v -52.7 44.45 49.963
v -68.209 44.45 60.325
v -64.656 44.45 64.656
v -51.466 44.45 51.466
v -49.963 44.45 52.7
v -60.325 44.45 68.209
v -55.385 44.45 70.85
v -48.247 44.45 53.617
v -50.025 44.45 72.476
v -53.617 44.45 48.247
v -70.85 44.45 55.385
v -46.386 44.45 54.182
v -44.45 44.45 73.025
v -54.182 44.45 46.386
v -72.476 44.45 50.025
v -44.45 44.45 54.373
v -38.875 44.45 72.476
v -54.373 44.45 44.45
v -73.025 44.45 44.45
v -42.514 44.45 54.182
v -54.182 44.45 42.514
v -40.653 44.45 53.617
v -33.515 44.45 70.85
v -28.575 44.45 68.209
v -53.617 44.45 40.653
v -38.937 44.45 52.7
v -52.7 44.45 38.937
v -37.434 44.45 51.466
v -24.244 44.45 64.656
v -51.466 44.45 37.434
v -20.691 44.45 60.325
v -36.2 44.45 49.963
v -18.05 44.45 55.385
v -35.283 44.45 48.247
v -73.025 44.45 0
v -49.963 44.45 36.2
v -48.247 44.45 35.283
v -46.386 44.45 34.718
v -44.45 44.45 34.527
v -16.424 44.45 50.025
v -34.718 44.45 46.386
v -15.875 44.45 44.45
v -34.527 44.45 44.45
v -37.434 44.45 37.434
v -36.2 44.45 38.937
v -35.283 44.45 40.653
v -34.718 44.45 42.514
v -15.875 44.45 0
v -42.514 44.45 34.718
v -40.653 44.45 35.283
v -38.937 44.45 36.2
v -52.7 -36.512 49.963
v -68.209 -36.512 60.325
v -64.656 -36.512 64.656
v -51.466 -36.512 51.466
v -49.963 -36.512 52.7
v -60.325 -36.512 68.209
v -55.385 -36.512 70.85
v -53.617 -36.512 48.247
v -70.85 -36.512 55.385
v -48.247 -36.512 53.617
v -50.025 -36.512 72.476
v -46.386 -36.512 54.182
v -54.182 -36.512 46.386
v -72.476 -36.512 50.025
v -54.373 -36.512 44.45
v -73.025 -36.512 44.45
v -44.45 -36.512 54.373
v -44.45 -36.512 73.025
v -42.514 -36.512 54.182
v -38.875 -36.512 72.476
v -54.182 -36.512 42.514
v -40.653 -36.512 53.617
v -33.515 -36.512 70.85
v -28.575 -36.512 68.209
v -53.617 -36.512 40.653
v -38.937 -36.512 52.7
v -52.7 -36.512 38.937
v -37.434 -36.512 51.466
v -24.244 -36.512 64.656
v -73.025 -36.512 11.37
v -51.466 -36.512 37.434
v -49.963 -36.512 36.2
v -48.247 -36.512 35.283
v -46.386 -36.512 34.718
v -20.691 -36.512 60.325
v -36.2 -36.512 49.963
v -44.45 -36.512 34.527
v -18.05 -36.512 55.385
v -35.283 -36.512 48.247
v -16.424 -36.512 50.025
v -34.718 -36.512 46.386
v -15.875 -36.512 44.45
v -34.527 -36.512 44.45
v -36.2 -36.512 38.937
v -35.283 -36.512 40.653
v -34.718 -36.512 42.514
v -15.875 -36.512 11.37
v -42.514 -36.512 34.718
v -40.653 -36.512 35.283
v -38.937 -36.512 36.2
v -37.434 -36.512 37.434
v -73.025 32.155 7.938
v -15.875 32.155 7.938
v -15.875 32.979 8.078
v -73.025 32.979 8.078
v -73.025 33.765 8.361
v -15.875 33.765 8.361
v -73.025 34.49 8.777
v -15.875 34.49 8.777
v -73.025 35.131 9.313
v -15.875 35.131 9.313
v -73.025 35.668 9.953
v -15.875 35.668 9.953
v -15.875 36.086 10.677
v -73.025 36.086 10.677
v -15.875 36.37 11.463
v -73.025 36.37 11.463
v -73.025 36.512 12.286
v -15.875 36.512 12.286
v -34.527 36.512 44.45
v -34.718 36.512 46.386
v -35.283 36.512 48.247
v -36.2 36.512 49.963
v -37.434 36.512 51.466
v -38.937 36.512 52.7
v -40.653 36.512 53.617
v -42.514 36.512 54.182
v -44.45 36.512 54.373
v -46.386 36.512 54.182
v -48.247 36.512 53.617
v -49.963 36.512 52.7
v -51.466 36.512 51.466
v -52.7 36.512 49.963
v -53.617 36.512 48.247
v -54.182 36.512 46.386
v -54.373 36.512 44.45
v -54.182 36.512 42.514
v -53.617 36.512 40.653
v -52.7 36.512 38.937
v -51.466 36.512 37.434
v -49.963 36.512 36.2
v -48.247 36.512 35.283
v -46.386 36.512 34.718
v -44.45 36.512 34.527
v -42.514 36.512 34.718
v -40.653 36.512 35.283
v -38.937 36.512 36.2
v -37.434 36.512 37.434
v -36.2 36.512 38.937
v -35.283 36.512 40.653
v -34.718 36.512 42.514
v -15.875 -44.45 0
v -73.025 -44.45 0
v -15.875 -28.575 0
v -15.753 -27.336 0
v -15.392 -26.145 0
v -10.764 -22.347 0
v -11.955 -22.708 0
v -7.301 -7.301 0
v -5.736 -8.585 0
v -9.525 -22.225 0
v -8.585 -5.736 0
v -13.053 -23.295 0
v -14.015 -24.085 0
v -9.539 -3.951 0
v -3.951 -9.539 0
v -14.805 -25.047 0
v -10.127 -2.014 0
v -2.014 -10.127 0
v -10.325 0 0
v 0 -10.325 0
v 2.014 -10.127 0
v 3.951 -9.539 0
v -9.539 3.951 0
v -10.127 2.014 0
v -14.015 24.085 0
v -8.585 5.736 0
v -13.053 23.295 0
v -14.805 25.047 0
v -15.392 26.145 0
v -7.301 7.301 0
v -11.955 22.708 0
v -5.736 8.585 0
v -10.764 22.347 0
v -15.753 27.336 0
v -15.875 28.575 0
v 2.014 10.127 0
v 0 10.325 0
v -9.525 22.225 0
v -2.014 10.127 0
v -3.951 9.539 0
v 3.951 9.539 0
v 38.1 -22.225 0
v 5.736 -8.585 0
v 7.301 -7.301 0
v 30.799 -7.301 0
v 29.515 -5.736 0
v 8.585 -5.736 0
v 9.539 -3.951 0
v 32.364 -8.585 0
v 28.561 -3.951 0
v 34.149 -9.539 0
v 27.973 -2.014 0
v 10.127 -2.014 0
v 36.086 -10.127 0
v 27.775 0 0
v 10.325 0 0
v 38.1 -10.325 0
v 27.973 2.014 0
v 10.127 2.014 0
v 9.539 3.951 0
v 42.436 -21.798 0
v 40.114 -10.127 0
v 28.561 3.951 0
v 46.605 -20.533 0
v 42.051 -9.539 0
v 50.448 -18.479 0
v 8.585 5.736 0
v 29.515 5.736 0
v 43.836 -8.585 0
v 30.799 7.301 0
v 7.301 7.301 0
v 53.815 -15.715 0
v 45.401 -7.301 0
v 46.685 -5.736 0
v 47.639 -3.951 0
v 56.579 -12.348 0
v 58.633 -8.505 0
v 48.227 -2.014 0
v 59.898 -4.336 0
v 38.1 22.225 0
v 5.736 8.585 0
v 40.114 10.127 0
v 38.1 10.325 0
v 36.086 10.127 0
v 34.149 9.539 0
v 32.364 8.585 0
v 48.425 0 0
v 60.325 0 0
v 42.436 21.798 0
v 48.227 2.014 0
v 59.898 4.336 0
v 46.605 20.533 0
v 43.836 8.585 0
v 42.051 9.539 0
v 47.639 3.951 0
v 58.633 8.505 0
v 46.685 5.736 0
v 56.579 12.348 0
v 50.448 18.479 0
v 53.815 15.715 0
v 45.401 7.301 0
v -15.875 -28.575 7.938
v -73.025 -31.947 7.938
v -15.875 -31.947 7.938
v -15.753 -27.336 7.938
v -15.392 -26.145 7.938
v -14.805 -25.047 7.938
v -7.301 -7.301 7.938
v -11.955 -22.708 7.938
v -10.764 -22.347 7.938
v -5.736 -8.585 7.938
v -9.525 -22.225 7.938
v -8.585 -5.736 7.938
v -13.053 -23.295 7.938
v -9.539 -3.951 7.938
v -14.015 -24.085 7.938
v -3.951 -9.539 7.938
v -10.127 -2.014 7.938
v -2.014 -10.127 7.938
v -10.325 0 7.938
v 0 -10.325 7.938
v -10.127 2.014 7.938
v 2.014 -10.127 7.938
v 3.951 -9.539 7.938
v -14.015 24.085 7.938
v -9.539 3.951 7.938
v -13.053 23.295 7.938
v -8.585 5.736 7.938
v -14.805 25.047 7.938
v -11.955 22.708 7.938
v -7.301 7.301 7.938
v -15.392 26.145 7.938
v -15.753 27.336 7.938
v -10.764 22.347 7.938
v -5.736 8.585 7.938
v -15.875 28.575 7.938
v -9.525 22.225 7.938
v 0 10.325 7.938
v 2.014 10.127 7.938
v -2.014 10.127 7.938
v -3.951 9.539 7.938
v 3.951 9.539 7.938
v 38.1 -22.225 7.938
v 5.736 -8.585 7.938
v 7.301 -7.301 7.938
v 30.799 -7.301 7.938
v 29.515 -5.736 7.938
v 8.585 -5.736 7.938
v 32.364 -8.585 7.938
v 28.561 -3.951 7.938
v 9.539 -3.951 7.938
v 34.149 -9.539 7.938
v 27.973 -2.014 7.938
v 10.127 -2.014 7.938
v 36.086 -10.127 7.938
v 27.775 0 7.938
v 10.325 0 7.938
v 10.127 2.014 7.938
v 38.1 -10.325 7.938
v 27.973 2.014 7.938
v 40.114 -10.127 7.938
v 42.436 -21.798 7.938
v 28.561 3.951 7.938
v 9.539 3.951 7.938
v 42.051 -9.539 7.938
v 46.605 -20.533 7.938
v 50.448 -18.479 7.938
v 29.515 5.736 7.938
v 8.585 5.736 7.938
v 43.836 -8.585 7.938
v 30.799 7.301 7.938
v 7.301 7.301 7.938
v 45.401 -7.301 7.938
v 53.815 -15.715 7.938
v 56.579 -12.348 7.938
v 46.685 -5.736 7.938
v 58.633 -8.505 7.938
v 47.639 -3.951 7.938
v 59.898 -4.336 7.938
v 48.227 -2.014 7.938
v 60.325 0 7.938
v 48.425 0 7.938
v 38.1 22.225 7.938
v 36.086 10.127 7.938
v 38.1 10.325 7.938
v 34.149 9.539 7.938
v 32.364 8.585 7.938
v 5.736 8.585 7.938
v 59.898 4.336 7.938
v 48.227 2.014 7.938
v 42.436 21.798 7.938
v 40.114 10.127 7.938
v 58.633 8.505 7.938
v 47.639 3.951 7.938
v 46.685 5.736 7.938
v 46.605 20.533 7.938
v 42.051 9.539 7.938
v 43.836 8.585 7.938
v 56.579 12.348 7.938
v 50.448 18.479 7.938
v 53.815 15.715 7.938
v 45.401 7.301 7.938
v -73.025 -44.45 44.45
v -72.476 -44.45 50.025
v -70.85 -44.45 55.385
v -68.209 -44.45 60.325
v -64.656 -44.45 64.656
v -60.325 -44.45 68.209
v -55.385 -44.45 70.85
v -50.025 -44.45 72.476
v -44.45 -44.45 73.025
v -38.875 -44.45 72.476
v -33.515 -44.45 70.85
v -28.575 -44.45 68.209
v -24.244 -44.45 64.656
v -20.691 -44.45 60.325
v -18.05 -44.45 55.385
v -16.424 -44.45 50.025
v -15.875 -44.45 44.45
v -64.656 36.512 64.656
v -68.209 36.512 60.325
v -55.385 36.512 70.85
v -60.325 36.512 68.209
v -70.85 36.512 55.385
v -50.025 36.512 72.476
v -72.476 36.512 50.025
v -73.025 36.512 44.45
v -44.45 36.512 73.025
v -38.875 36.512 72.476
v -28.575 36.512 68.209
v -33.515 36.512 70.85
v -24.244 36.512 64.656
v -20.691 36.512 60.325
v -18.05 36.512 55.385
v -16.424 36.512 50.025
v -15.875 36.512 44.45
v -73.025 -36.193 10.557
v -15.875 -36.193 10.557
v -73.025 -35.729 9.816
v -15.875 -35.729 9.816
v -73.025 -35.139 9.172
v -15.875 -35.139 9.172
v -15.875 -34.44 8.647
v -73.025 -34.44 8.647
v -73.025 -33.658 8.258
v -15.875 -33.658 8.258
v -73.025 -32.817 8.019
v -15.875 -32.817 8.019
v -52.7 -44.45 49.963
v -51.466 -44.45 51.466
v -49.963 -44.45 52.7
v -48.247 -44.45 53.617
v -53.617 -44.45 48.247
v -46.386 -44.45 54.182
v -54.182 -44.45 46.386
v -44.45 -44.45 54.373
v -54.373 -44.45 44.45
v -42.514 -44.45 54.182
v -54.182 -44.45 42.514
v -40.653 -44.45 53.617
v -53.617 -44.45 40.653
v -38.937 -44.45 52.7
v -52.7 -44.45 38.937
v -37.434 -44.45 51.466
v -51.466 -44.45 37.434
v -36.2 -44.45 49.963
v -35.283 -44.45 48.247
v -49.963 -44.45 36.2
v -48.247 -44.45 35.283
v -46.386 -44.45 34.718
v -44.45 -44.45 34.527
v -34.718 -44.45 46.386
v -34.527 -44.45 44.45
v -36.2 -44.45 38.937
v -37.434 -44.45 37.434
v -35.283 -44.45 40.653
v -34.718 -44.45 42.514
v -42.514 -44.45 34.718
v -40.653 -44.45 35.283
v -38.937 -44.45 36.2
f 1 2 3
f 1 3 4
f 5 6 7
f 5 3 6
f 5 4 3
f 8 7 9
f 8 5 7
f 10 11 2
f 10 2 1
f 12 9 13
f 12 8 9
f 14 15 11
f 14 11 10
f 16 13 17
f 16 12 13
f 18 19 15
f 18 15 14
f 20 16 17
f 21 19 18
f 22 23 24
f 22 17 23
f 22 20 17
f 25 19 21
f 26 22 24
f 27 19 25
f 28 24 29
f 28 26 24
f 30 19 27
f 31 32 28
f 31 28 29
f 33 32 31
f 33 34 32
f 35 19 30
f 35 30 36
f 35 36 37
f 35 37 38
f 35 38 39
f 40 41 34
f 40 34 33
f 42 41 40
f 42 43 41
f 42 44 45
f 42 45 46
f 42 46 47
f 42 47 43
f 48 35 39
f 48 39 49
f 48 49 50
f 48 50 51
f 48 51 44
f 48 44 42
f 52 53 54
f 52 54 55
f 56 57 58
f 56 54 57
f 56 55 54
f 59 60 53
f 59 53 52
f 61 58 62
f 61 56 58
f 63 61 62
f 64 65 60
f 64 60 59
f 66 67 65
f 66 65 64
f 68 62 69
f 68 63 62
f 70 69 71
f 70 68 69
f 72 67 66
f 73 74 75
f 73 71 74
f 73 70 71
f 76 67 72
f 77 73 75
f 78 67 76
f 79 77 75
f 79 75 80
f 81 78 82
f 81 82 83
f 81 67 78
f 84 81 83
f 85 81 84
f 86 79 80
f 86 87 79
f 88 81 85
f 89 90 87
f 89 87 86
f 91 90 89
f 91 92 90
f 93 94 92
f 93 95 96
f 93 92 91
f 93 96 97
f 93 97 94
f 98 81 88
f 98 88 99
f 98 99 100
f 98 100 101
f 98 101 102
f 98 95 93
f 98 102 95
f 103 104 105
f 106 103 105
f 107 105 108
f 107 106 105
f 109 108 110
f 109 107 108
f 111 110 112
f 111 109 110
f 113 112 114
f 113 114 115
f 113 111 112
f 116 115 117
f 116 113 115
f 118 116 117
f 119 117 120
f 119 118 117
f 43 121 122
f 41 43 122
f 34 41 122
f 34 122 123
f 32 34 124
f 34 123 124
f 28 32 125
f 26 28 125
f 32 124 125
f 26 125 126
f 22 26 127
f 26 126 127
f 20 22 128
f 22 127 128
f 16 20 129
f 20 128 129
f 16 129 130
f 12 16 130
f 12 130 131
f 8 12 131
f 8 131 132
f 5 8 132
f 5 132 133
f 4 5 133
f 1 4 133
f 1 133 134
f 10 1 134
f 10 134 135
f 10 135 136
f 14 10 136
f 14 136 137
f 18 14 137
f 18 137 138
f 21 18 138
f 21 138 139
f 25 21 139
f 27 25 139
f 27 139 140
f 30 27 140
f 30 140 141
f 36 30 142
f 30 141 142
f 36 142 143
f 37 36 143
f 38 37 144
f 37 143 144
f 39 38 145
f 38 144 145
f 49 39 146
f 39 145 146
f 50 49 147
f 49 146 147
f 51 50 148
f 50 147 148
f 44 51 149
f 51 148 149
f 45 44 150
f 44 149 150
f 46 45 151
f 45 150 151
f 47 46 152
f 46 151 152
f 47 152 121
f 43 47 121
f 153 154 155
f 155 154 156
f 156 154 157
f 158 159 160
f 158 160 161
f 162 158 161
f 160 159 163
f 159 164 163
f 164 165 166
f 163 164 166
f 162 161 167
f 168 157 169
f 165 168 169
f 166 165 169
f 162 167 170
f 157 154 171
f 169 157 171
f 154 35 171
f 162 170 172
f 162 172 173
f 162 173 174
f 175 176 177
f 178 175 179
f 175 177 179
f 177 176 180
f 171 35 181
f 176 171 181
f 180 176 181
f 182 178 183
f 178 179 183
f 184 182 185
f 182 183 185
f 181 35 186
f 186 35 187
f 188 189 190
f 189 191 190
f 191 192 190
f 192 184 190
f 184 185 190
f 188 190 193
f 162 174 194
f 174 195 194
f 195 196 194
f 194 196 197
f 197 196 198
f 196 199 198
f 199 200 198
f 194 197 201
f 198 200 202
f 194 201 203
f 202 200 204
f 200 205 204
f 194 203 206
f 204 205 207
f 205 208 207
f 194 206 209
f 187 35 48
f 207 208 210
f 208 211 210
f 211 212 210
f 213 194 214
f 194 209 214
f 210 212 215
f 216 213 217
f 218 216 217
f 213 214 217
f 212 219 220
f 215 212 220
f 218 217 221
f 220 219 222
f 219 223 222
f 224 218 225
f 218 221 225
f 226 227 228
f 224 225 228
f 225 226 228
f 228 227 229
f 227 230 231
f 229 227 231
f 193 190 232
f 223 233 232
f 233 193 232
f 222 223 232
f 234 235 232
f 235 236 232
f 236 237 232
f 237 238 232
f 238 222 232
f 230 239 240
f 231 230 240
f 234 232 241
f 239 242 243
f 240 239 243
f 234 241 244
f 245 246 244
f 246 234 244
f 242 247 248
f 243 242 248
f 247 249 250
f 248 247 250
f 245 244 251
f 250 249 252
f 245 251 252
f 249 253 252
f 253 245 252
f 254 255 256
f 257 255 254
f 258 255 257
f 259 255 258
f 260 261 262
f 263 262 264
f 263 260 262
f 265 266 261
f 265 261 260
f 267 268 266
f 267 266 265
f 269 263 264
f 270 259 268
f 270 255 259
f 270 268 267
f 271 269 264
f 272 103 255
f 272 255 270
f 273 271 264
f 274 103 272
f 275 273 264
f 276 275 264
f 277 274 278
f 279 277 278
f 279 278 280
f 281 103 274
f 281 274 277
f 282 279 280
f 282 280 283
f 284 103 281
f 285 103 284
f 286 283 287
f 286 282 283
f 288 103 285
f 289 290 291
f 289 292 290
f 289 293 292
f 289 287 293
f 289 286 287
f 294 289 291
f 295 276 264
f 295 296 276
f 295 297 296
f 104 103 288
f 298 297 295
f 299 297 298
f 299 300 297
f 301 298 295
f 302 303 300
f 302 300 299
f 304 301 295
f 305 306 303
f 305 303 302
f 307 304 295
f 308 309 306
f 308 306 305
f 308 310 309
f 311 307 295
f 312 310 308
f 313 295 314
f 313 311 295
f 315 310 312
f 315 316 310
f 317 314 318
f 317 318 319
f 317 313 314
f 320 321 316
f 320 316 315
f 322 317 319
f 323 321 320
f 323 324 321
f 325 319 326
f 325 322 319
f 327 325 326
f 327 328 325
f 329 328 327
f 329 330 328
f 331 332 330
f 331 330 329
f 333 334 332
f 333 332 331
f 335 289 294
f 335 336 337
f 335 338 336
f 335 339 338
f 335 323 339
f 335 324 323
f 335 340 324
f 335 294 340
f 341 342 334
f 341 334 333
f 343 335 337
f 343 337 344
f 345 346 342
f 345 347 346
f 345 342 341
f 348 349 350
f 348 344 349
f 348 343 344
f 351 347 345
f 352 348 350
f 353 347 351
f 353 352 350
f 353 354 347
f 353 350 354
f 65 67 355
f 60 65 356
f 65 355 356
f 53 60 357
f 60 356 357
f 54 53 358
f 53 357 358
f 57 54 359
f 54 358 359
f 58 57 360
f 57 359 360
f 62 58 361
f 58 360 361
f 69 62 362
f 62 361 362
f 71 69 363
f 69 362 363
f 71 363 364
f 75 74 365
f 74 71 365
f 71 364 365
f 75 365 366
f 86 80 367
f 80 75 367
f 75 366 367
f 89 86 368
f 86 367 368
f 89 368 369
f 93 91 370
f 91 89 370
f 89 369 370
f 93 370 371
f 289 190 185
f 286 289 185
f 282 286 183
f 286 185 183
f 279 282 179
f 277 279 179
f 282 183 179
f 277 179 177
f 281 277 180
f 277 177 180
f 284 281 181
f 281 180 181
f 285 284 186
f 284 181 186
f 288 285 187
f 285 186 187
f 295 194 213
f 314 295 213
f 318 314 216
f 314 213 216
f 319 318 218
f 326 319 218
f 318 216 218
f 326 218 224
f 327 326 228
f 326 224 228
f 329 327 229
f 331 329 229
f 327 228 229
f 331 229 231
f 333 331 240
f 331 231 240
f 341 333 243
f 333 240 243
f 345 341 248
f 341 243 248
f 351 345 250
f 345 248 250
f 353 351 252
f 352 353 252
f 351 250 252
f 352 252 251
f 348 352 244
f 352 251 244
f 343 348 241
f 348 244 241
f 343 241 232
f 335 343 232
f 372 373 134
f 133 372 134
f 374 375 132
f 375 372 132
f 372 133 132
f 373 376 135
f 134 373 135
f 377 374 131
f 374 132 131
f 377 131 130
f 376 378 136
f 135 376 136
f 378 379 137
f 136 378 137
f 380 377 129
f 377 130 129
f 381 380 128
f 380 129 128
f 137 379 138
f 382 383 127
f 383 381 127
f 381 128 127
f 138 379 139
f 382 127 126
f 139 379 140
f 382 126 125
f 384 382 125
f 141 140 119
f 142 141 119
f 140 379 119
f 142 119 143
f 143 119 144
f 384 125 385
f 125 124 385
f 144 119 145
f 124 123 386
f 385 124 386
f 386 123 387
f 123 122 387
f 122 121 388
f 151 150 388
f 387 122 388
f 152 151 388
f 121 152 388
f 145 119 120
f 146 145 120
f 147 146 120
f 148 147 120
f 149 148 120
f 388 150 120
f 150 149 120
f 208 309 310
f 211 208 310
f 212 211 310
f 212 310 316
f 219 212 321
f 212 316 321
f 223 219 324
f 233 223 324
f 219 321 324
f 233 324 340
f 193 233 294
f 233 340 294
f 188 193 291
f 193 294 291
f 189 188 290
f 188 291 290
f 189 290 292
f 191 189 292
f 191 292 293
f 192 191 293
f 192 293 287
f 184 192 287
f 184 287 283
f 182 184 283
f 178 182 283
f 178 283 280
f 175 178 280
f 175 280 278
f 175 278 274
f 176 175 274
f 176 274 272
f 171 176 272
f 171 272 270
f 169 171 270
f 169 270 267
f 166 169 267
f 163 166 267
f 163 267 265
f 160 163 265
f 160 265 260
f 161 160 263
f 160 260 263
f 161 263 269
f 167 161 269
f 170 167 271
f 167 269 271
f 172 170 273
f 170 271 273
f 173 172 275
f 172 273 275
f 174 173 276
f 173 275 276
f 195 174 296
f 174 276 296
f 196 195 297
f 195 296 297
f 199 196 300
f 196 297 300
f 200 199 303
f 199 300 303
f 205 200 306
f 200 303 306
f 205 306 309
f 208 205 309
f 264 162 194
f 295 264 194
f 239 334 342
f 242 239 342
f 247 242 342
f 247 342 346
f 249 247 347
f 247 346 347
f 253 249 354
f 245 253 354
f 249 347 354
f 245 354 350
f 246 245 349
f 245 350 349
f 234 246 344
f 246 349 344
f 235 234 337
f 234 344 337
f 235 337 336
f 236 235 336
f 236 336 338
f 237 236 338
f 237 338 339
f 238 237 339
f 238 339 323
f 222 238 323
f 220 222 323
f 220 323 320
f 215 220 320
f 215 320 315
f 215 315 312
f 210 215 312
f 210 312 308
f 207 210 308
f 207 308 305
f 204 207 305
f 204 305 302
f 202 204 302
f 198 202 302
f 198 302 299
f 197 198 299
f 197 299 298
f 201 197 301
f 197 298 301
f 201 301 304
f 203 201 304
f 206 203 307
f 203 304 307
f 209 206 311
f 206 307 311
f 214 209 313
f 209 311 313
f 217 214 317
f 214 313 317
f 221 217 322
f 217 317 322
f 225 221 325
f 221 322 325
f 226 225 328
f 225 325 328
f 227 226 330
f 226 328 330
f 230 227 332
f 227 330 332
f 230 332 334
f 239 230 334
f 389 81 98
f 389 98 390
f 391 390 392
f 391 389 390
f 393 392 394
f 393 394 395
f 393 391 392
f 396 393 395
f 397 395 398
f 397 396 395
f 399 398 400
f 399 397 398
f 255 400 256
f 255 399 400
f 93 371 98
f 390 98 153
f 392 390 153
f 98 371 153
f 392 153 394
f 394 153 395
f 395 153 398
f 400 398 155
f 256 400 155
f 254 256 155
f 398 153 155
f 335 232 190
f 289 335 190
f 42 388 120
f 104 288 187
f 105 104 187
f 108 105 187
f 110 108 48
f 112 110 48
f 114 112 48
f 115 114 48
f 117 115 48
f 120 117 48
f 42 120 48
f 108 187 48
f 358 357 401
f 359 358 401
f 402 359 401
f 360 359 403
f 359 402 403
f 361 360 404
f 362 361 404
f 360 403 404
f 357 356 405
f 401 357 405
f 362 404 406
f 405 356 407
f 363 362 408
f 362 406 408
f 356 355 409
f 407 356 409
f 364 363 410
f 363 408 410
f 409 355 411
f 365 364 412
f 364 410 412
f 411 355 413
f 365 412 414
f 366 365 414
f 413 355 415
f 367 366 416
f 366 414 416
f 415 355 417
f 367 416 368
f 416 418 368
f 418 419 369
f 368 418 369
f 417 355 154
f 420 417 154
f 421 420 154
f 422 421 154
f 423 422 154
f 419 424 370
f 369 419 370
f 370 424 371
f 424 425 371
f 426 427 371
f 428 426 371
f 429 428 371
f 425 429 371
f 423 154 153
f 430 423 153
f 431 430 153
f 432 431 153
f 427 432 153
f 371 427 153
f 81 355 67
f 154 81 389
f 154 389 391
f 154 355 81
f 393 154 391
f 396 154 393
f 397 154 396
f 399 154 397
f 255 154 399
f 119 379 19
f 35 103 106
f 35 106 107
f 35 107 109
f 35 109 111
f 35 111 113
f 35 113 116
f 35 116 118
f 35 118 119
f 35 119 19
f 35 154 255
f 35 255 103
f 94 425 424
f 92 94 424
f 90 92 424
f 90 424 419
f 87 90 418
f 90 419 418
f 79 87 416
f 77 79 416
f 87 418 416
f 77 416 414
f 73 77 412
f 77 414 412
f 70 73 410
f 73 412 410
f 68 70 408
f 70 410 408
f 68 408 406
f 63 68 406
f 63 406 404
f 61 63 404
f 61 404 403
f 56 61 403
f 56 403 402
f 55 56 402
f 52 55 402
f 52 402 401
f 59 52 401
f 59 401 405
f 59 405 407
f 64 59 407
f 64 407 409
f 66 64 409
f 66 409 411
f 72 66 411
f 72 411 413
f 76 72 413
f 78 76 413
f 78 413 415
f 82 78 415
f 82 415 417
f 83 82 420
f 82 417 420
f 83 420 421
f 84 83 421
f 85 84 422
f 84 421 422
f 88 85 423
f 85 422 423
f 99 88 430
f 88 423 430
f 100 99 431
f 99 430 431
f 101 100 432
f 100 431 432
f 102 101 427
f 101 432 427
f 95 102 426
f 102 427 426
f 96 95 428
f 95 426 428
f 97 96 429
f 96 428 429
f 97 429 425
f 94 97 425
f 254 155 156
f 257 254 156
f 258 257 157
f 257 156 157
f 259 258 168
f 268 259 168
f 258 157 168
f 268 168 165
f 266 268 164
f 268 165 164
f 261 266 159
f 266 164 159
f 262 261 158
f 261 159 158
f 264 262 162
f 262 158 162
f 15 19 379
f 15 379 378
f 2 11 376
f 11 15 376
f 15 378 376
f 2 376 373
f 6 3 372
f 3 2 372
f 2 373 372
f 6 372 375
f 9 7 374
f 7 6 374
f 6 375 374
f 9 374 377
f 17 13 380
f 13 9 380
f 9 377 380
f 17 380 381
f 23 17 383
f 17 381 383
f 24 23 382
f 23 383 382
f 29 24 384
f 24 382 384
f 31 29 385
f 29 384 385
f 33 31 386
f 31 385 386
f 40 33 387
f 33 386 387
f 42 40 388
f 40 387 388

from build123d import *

# Parameters (mm, degrees)
F1_DEPTH = 7.9375
F2_W     = 57.15
F2_H     = 7.9375
F3_DEPTH = 76.2
F4_R     = 9.92251
F5_DEPTH = 88.901
F6_R     = 10.3251
F7_DEPTH = 25.4
F9_DEPTH = 57.15


with BuildPart() as f1:
    # F0 (on Top) → F1 (new body)
    with BuildSketch(Plane.XY):
        with BuildLine():
            Line((-9.525, -22.225), (38.1, -22.225))
            ThreePointArc((38.1, -22.225), (60.325, 0), (38.1, 22.225))
            Line((38.1, 22.225), (-9.525, 22.225))
            ThreePointArc((-9.525, 22.225), (-14.015128, 24.084872), (-15.875, 28.575))
            Line((-15.875, 28.575), (-15.875, 44.45))
            Line((-15.875, 44.45), (-73.025, 44.45))
            Line((-73.025, 44.45), (-73.025, -44.45))
            Line((-73.025, -44.45), (-15.875, -44.45))
            Line((-15.875, -44.45), (-15.875, -28.575))
            ThreePointArc((-15.875, -28.575), (-14.015128, -24.084872), (-9.525, -22.225))
        make_face()
    extrude(amount=F1_DEPTH)

    # F2 (on face) → F3 (join)
    with BuildSketch(Plane.XY.offset(7.9375)):
        with Locations((-44.45, 40.48125)):
            Rectangle(F2_W, F2_H)
        with Locations((-44.45, -40.48125)):
            Rectangle(F2_W, F2_H)
    extrude(amount=F3_DEPTH)

    # F4 (on face) → F5 (cut, through all)
    with BuildSketch(Plane.XZ.offset(44.45)):
        with BuildLine():
            ThreePointArc((-73.025, 44.45), (-44.45, 73.025), (-15.875, 44.45))
            Line((-15.875, 44.45), (-15.875, 84.1375))
            Line((-15.875, 84.1375), (-73.025, 84.1375))
            Line((-73.025, 84.1375), (-73.025, 44.45))
        make_face()
        with Locations((-44.45, 44.45)):
            Circle(F4_R)
    extrude(amount=-F5_DEPTH, mode=Mode.SUBTRACT)

    # F6 (on face) → F7 (cut)
    with BuildSketch(Plane.XY.offset(7.9375)):
        with Locations((38.1, 0)):
            Circle(F6_R)
        Circle(F6_R)
    extrude(amount=-F7_DEPTH, mode=Mode.SUBTRACT)

    # F8 (on face) → F9 (join)
    with BuildSketch(Plane(origin=(-73.025, 0, 0), x_dir=(0, -1, 0), z_dir=(-1, 0, 0))):
        with BuildLine():
            Line((-36.5125, 12.286079), (-36.5125, 13.082203))
            ThreePointArc((-36.5125, 13.082203), (-36.529165, 12.684141), (-36.5125, 12.286079))
        make_face()
        with BuildLine():
            Line((-31.378329, 7.9375), (-32.155001, 7.9375))
            ThreePointArc((-32.155001, 7.9375), (-31.766665, 7.921641), (-31.378329, 7.9375))
        make_face()
        with BuildLine():
            ThreePointArc((-32.155001, 7.9375), (-35.130808, 9.313096), (-36.5125, 12.286079))
            Line((-36.5125, 12.286079), (-36.5125, 7.9375))
            Line((-36.5125, 7.9375), (-32.155001, 7.9375))
        make_face()
        with BuildLine():
            Line((36.5125, 14.030189), (36.5125, 11.369799))
            ThreePointArc((36.5125, 11.369799), (36.702037, 12.699994), (36.5125, 14.030189))
        make_face()
        with BuildLine():
            ThreePointArc((36.5125, 11.369799), (34.801446, 8.893304), (31.947121, 7.9375))
            Line((31.947121, 7.9375), (36.5125, 7.9375))
            Line((36.5125, 7.9375), (36.5125, 11.369799))
        make_face()
    extrude(amount=-F9_DEPTH)


solid = f1.part
